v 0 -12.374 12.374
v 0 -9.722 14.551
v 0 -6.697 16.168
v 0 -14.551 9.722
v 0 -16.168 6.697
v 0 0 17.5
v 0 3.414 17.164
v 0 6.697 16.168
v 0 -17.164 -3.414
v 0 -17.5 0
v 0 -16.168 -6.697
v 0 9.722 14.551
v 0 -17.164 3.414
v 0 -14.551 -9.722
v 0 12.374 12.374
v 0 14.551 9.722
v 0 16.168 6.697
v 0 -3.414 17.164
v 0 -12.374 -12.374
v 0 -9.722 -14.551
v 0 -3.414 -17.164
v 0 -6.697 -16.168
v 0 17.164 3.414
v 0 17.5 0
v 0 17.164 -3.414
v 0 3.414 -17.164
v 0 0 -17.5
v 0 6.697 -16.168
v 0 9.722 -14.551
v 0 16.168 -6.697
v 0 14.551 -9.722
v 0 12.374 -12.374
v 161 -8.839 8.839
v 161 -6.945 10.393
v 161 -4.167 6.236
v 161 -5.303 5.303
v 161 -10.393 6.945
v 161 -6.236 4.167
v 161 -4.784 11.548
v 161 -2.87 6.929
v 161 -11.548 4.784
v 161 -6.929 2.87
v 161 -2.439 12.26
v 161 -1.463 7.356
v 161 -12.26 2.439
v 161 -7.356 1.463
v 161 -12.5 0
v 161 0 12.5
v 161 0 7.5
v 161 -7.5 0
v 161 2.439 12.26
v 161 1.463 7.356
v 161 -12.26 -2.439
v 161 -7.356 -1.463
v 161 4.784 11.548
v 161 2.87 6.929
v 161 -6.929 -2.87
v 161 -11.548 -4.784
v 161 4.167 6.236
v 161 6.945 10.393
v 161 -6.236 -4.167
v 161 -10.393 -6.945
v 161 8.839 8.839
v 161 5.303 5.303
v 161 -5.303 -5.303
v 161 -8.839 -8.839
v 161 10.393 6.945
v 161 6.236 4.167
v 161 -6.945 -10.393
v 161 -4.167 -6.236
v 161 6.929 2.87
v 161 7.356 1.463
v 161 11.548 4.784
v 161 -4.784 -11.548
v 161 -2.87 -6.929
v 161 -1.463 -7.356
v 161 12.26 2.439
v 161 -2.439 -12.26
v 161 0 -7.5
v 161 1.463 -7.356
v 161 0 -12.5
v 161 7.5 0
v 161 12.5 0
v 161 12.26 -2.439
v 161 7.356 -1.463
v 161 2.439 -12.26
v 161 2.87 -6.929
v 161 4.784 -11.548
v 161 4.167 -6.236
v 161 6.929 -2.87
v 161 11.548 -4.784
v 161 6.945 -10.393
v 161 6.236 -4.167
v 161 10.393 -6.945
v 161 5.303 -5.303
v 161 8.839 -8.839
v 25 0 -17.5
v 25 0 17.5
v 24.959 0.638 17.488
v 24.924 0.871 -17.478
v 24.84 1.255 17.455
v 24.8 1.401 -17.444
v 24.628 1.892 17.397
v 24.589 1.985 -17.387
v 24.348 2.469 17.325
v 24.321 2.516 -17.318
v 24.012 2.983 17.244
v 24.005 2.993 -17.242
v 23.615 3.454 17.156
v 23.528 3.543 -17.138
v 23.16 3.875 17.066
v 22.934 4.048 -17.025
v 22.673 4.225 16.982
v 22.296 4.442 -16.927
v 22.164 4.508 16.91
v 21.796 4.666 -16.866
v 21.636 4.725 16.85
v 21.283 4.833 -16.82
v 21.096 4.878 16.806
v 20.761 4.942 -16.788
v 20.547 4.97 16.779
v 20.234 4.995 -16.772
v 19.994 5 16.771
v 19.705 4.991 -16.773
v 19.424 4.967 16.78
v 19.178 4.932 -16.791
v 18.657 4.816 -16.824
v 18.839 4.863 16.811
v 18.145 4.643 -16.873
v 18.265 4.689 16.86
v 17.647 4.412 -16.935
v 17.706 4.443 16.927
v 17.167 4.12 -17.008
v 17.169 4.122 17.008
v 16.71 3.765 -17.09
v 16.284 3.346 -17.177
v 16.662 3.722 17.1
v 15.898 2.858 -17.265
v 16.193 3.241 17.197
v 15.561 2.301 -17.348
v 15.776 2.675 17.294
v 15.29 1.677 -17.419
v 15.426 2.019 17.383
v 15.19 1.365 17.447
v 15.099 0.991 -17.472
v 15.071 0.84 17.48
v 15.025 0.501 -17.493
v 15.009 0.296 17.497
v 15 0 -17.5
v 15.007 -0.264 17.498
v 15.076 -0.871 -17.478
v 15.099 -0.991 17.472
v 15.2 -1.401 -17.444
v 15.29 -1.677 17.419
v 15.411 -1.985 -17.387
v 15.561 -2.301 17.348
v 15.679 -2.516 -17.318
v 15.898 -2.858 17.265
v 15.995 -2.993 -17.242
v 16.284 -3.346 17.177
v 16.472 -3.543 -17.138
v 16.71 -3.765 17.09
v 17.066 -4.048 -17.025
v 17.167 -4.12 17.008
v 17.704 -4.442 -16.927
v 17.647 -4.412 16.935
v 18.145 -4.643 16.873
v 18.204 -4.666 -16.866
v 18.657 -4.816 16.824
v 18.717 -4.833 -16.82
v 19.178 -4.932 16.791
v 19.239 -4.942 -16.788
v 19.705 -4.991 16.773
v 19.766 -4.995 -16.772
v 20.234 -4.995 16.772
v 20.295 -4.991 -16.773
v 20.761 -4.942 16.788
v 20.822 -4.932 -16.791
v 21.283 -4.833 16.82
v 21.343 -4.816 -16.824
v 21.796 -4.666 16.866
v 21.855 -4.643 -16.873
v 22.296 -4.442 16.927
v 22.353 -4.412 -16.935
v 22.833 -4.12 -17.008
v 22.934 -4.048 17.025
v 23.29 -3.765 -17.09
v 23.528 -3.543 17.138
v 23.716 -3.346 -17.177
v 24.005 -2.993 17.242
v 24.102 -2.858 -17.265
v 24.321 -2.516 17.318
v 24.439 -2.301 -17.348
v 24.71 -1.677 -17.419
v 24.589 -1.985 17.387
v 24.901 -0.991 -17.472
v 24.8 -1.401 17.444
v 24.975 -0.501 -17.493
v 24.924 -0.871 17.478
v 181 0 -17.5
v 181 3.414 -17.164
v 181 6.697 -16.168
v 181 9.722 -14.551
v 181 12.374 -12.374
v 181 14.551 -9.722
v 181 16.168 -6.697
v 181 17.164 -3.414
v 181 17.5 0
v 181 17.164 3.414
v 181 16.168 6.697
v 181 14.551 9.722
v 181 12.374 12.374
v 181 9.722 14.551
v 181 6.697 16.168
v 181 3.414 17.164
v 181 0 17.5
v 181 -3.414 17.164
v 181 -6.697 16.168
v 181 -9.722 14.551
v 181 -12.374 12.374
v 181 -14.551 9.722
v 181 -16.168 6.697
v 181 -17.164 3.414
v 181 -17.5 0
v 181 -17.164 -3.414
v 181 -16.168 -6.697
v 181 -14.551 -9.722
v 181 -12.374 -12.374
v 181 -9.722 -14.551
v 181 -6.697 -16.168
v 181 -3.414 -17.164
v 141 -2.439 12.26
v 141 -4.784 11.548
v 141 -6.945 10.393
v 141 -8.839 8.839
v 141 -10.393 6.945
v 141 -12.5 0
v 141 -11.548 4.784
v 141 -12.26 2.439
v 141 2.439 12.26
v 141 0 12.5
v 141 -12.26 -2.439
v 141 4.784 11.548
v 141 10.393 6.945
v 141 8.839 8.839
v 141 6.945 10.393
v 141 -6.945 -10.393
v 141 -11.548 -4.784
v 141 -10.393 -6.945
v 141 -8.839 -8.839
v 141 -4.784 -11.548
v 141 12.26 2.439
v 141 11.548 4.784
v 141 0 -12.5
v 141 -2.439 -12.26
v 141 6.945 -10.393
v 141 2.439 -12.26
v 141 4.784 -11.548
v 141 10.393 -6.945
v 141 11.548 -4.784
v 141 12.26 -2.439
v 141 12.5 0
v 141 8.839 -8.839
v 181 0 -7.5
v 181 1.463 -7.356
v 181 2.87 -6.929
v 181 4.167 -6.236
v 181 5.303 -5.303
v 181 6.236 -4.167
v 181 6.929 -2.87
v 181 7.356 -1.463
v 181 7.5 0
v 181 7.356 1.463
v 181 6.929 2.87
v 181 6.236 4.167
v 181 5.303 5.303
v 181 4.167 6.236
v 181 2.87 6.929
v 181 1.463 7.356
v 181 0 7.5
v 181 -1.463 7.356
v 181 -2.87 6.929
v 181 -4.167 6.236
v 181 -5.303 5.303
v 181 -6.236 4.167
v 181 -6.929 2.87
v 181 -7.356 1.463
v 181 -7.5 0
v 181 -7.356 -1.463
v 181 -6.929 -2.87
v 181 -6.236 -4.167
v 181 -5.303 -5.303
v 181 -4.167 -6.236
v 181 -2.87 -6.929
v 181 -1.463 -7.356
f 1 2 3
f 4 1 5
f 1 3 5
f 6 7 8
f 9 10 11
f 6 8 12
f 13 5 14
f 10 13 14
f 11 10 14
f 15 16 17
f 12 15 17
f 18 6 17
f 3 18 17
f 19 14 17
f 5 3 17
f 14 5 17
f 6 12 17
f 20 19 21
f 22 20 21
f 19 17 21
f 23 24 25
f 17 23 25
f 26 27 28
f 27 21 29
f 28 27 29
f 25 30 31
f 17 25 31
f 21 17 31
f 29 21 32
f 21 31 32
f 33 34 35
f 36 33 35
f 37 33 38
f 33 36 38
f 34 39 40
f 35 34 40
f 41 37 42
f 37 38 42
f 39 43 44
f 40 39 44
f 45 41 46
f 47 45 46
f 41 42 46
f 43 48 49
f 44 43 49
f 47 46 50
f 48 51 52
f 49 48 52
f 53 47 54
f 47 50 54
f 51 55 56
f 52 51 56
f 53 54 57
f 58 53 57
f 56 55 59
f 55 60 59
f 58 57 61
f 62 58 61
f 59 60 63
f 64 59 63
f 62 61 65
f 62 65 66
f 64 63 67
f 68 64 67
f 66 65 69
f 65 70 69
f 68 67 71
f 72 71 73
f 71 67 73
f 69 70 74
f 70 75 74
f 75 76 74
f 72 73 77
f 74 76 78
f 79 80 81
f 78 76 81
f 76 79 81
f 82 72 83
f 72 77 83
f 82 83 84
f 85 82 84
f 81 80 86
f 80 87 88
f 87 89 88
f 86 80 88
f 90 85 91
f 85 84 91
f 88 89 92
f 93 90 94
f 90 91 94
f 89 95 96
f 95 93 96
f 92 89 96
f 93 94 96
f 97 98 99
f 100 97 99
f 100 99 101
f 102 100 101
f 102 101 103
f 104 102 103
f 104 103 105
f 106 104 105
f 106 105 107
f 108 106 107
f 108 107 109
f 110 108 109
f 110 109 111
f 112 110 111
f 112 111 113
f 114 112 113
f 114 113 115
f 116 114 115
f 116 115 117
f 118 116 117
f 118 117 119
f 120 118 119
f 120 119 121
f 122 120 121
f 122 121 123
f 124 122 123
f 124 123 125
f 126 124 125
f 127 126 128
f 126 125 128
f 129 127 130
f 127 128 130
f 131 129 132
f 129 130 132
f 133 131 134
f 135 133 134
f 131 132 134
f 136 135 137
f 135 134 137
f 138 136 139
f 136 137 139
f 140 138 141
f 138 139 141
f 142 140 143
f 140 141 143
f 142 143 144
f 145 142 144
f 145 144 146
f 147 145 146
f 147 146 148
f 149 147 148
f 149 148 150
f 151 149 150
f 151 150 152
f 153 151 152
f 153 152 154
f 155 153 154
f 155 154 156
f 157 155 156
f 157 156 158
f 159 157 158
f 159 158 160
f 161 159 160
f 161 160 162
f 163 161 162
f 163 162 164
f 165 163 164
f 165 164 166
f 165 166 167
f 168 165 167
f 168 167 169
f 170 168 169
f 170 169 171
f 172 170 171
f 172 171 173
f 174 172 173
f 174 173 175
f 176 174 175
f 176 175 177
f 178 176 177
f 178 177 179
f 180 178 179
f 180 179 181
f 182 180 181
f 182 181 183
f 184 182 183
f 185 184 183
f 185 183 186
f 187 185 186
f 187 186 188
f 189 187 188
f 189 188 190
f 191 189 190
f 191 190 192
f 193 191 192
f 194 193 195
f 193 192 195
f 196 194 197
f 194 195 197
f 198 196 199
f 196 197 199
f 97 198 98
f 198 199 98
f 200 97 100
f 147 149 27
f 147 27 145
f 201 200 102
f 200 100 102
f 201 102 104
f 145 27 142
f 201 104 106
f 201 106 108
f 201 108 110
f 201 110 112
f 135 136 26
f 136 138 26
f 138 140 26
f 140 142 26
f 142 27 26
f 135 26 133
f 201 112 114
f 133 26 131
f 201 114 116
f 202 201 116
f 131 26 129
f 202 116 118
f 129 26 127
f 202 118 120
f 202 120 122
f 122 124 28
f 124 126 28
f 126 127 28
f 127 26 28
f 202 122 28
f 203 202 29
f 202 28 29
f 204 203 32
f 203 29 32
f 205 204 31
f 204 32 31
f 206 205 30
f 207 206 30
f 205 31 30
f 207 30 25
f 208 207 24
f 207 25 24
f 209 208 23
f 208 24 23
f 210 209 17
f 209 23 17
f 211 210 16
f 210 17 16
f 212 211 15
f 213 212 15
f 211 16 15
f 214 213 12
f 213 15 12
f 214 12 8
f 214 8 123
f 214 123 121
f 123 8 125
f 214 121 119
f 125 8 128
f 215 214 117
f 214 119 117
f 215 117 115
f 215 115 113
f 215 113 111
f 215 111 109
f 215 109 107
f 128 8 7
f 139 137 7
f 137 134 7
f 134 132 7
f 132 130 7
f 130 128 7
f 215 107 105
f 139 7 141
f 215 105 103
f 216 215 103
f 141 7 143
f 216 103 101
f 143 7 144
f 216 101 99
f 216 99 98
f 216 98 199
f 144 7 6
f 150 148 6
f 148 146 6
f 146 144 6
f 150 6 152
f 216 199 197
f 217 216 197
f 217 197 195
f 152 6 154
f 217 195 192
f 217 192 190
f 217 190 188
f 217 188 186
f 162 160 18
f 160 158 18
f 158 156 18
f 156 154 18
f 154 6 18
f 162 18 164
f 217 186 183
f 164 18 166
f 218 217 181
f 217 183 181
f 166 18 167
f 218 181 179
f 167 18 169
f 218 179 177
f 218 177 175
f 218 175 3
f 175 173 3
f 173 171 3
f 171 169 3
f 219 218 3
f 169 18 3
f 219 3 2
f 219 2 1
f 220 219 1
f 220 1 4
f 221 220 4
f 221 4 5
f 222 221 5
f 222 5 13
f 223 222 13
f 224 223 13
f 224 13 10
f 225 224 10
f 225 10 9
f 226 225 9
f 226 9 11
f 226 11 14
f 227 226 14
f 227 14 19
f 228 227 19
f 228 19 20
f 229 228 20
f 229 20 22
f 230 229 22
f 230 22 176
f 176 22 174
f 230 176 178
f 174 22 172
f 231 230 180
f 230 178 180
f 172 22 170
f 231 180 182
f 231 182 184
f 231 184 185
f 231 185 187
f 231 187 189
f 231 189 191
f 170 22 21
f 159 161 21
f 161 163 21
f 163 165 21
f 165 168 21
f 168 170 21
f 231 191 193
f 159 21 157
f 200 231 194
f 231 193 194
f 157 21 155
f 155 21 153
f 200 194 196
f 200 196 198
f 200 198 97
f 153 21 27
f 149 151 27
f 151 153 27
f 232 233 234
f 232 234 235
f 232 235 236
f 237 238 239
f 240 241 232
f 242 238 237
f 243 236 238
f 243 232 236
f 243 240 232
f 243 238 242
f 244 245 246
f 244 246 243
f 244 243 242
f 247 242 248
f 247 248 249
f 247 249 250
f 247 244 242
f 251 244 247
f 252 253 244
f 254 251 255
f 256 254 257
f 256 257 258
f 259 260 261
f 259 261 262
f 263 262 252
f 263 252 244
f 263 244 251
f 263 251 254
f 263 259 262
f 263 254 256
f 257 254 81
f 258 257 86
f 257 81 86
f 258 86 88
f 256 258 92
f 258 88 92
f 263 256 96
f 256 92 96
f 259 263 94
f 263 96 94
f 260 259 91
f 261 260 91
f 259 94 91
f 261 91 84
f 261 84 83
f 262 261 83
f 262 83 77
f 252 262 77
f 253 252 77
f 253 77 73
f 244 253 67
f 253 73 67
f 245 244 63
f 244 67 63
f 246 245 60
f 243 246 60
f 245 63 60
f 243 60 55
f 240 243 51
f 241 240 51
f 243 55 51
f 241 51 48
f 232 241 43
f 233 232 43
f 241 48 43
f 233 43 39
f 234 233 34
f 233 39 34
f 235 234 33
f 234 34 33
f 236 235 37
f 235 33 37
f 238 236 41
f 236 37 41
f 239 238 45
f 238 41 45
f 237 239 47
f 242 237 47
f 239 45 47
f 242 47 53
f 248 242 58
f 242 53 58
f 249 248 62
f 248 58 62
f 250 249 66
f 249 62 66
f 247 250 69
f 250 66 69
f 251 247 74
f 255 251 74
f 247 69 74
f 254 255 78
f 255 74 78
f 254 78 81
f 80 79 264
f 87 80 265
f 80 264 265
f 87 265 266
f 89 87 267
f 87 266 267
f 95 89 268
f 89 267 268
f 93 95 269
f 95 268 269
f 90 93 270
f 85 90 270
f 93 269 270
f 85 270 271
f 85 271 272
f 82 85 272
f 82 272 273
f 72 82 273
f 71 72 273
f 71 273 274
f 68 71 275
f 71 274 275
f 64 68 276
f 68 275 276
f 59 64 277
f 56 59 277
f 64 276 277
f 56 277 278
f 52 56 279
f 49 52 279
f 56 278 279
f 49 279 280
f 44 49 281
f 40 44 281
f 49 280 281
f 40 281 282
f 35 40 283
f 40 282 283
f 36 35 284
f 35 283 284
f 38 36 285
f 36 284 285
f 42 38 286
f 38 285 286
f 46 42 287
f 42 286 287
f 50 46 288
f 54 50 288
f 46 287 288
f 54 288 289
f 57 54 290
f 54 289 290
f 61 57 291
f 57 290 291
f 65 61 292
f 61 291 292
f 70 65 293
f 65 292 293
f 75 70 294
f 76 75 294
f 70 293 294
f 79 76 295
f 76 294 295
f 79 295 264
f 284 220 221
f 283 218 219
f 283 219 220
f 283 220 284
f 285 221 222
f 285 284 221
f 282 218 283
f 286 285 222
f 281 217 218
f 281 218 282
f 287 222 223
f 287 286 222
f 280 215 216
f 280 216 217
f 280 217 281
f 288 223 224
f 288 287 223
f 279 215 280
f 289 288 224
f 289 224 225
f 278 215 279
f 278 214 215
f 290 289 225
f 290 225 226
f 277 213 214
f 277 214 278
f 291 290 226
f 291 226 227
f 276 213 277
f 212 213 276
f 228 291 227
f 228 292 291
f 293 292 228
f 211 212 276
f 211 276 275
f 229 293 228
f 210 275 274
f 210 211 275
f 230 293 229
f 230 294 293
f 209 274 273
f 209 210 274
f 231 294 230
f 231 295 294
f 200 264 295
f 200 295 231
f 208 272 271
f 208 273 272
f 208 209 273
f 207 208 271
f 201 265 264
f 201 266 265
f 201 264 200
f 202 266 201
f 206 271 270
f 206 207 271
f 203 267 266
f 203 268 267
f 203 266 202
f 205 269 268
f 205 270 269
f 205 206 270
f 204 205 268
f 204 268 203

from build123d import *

# Parameters (mm, degrees)
SKETCH2_R           = 17.5
BOSS_EXTRUDE1_DEPTH = 181
SKETCH3_R           = 5
CUT_EXTRUDE1_DEPTH  = 181
SKETCH4_R           = 7.5
CUT_EXTRUDE2_DEPTH  = 20
SKETCH5_R           = 12.5
CUT_EXTRUDE3_DEPTH  = 20


with BuildPart() as part:
    # Sketch2 → Boss-Extrude1 (new body)
    with BuildSketch(Plane(origin=(0, 0, 0), x_dir=(0, 0, -1), z_dir=(1, 0, 0))):
        Circle(SKETCH2_R)
    extrude(amount=BOSS_EXTRUDE1_DEPTH)

    # Sketch3 → Cut-Extrude1 (cut)
    with BuildSketch(Plane.XY.offset(17.5)):
        with Locations((20, 0)):
            Circle(SKETCH3_R)
    extrude(amount=-CUT_EXTRUDE1_DEPTH, mode=Mode.SUBTRACT)

    # Sketch4 → Cut-Extrude2 (cut)
    with BuildSketch(Plane(origin=(181, 0, 0), x_dir=(0, 0, -1), z_dir=(1, 0, 0))):
        Circle(SKETCH4_R)
    extrude(amount=-CUT_EXTRUDE2_DEPTH, mode=Mode.SUBTRACT)

    # Sketch5 → Cut-Extrude3 (cut)
    with BuildSketch(Plane(origin=(161, 0, 0), x_dir=(0, 0, -1), z_dir=(1, 0, 0))):
        Circle(SKETCH5_R)
    extrude(amount=-CUT_EXTRUDE3_DEPTH, mode=Mode.SUBTRACT)


solid = part.part
